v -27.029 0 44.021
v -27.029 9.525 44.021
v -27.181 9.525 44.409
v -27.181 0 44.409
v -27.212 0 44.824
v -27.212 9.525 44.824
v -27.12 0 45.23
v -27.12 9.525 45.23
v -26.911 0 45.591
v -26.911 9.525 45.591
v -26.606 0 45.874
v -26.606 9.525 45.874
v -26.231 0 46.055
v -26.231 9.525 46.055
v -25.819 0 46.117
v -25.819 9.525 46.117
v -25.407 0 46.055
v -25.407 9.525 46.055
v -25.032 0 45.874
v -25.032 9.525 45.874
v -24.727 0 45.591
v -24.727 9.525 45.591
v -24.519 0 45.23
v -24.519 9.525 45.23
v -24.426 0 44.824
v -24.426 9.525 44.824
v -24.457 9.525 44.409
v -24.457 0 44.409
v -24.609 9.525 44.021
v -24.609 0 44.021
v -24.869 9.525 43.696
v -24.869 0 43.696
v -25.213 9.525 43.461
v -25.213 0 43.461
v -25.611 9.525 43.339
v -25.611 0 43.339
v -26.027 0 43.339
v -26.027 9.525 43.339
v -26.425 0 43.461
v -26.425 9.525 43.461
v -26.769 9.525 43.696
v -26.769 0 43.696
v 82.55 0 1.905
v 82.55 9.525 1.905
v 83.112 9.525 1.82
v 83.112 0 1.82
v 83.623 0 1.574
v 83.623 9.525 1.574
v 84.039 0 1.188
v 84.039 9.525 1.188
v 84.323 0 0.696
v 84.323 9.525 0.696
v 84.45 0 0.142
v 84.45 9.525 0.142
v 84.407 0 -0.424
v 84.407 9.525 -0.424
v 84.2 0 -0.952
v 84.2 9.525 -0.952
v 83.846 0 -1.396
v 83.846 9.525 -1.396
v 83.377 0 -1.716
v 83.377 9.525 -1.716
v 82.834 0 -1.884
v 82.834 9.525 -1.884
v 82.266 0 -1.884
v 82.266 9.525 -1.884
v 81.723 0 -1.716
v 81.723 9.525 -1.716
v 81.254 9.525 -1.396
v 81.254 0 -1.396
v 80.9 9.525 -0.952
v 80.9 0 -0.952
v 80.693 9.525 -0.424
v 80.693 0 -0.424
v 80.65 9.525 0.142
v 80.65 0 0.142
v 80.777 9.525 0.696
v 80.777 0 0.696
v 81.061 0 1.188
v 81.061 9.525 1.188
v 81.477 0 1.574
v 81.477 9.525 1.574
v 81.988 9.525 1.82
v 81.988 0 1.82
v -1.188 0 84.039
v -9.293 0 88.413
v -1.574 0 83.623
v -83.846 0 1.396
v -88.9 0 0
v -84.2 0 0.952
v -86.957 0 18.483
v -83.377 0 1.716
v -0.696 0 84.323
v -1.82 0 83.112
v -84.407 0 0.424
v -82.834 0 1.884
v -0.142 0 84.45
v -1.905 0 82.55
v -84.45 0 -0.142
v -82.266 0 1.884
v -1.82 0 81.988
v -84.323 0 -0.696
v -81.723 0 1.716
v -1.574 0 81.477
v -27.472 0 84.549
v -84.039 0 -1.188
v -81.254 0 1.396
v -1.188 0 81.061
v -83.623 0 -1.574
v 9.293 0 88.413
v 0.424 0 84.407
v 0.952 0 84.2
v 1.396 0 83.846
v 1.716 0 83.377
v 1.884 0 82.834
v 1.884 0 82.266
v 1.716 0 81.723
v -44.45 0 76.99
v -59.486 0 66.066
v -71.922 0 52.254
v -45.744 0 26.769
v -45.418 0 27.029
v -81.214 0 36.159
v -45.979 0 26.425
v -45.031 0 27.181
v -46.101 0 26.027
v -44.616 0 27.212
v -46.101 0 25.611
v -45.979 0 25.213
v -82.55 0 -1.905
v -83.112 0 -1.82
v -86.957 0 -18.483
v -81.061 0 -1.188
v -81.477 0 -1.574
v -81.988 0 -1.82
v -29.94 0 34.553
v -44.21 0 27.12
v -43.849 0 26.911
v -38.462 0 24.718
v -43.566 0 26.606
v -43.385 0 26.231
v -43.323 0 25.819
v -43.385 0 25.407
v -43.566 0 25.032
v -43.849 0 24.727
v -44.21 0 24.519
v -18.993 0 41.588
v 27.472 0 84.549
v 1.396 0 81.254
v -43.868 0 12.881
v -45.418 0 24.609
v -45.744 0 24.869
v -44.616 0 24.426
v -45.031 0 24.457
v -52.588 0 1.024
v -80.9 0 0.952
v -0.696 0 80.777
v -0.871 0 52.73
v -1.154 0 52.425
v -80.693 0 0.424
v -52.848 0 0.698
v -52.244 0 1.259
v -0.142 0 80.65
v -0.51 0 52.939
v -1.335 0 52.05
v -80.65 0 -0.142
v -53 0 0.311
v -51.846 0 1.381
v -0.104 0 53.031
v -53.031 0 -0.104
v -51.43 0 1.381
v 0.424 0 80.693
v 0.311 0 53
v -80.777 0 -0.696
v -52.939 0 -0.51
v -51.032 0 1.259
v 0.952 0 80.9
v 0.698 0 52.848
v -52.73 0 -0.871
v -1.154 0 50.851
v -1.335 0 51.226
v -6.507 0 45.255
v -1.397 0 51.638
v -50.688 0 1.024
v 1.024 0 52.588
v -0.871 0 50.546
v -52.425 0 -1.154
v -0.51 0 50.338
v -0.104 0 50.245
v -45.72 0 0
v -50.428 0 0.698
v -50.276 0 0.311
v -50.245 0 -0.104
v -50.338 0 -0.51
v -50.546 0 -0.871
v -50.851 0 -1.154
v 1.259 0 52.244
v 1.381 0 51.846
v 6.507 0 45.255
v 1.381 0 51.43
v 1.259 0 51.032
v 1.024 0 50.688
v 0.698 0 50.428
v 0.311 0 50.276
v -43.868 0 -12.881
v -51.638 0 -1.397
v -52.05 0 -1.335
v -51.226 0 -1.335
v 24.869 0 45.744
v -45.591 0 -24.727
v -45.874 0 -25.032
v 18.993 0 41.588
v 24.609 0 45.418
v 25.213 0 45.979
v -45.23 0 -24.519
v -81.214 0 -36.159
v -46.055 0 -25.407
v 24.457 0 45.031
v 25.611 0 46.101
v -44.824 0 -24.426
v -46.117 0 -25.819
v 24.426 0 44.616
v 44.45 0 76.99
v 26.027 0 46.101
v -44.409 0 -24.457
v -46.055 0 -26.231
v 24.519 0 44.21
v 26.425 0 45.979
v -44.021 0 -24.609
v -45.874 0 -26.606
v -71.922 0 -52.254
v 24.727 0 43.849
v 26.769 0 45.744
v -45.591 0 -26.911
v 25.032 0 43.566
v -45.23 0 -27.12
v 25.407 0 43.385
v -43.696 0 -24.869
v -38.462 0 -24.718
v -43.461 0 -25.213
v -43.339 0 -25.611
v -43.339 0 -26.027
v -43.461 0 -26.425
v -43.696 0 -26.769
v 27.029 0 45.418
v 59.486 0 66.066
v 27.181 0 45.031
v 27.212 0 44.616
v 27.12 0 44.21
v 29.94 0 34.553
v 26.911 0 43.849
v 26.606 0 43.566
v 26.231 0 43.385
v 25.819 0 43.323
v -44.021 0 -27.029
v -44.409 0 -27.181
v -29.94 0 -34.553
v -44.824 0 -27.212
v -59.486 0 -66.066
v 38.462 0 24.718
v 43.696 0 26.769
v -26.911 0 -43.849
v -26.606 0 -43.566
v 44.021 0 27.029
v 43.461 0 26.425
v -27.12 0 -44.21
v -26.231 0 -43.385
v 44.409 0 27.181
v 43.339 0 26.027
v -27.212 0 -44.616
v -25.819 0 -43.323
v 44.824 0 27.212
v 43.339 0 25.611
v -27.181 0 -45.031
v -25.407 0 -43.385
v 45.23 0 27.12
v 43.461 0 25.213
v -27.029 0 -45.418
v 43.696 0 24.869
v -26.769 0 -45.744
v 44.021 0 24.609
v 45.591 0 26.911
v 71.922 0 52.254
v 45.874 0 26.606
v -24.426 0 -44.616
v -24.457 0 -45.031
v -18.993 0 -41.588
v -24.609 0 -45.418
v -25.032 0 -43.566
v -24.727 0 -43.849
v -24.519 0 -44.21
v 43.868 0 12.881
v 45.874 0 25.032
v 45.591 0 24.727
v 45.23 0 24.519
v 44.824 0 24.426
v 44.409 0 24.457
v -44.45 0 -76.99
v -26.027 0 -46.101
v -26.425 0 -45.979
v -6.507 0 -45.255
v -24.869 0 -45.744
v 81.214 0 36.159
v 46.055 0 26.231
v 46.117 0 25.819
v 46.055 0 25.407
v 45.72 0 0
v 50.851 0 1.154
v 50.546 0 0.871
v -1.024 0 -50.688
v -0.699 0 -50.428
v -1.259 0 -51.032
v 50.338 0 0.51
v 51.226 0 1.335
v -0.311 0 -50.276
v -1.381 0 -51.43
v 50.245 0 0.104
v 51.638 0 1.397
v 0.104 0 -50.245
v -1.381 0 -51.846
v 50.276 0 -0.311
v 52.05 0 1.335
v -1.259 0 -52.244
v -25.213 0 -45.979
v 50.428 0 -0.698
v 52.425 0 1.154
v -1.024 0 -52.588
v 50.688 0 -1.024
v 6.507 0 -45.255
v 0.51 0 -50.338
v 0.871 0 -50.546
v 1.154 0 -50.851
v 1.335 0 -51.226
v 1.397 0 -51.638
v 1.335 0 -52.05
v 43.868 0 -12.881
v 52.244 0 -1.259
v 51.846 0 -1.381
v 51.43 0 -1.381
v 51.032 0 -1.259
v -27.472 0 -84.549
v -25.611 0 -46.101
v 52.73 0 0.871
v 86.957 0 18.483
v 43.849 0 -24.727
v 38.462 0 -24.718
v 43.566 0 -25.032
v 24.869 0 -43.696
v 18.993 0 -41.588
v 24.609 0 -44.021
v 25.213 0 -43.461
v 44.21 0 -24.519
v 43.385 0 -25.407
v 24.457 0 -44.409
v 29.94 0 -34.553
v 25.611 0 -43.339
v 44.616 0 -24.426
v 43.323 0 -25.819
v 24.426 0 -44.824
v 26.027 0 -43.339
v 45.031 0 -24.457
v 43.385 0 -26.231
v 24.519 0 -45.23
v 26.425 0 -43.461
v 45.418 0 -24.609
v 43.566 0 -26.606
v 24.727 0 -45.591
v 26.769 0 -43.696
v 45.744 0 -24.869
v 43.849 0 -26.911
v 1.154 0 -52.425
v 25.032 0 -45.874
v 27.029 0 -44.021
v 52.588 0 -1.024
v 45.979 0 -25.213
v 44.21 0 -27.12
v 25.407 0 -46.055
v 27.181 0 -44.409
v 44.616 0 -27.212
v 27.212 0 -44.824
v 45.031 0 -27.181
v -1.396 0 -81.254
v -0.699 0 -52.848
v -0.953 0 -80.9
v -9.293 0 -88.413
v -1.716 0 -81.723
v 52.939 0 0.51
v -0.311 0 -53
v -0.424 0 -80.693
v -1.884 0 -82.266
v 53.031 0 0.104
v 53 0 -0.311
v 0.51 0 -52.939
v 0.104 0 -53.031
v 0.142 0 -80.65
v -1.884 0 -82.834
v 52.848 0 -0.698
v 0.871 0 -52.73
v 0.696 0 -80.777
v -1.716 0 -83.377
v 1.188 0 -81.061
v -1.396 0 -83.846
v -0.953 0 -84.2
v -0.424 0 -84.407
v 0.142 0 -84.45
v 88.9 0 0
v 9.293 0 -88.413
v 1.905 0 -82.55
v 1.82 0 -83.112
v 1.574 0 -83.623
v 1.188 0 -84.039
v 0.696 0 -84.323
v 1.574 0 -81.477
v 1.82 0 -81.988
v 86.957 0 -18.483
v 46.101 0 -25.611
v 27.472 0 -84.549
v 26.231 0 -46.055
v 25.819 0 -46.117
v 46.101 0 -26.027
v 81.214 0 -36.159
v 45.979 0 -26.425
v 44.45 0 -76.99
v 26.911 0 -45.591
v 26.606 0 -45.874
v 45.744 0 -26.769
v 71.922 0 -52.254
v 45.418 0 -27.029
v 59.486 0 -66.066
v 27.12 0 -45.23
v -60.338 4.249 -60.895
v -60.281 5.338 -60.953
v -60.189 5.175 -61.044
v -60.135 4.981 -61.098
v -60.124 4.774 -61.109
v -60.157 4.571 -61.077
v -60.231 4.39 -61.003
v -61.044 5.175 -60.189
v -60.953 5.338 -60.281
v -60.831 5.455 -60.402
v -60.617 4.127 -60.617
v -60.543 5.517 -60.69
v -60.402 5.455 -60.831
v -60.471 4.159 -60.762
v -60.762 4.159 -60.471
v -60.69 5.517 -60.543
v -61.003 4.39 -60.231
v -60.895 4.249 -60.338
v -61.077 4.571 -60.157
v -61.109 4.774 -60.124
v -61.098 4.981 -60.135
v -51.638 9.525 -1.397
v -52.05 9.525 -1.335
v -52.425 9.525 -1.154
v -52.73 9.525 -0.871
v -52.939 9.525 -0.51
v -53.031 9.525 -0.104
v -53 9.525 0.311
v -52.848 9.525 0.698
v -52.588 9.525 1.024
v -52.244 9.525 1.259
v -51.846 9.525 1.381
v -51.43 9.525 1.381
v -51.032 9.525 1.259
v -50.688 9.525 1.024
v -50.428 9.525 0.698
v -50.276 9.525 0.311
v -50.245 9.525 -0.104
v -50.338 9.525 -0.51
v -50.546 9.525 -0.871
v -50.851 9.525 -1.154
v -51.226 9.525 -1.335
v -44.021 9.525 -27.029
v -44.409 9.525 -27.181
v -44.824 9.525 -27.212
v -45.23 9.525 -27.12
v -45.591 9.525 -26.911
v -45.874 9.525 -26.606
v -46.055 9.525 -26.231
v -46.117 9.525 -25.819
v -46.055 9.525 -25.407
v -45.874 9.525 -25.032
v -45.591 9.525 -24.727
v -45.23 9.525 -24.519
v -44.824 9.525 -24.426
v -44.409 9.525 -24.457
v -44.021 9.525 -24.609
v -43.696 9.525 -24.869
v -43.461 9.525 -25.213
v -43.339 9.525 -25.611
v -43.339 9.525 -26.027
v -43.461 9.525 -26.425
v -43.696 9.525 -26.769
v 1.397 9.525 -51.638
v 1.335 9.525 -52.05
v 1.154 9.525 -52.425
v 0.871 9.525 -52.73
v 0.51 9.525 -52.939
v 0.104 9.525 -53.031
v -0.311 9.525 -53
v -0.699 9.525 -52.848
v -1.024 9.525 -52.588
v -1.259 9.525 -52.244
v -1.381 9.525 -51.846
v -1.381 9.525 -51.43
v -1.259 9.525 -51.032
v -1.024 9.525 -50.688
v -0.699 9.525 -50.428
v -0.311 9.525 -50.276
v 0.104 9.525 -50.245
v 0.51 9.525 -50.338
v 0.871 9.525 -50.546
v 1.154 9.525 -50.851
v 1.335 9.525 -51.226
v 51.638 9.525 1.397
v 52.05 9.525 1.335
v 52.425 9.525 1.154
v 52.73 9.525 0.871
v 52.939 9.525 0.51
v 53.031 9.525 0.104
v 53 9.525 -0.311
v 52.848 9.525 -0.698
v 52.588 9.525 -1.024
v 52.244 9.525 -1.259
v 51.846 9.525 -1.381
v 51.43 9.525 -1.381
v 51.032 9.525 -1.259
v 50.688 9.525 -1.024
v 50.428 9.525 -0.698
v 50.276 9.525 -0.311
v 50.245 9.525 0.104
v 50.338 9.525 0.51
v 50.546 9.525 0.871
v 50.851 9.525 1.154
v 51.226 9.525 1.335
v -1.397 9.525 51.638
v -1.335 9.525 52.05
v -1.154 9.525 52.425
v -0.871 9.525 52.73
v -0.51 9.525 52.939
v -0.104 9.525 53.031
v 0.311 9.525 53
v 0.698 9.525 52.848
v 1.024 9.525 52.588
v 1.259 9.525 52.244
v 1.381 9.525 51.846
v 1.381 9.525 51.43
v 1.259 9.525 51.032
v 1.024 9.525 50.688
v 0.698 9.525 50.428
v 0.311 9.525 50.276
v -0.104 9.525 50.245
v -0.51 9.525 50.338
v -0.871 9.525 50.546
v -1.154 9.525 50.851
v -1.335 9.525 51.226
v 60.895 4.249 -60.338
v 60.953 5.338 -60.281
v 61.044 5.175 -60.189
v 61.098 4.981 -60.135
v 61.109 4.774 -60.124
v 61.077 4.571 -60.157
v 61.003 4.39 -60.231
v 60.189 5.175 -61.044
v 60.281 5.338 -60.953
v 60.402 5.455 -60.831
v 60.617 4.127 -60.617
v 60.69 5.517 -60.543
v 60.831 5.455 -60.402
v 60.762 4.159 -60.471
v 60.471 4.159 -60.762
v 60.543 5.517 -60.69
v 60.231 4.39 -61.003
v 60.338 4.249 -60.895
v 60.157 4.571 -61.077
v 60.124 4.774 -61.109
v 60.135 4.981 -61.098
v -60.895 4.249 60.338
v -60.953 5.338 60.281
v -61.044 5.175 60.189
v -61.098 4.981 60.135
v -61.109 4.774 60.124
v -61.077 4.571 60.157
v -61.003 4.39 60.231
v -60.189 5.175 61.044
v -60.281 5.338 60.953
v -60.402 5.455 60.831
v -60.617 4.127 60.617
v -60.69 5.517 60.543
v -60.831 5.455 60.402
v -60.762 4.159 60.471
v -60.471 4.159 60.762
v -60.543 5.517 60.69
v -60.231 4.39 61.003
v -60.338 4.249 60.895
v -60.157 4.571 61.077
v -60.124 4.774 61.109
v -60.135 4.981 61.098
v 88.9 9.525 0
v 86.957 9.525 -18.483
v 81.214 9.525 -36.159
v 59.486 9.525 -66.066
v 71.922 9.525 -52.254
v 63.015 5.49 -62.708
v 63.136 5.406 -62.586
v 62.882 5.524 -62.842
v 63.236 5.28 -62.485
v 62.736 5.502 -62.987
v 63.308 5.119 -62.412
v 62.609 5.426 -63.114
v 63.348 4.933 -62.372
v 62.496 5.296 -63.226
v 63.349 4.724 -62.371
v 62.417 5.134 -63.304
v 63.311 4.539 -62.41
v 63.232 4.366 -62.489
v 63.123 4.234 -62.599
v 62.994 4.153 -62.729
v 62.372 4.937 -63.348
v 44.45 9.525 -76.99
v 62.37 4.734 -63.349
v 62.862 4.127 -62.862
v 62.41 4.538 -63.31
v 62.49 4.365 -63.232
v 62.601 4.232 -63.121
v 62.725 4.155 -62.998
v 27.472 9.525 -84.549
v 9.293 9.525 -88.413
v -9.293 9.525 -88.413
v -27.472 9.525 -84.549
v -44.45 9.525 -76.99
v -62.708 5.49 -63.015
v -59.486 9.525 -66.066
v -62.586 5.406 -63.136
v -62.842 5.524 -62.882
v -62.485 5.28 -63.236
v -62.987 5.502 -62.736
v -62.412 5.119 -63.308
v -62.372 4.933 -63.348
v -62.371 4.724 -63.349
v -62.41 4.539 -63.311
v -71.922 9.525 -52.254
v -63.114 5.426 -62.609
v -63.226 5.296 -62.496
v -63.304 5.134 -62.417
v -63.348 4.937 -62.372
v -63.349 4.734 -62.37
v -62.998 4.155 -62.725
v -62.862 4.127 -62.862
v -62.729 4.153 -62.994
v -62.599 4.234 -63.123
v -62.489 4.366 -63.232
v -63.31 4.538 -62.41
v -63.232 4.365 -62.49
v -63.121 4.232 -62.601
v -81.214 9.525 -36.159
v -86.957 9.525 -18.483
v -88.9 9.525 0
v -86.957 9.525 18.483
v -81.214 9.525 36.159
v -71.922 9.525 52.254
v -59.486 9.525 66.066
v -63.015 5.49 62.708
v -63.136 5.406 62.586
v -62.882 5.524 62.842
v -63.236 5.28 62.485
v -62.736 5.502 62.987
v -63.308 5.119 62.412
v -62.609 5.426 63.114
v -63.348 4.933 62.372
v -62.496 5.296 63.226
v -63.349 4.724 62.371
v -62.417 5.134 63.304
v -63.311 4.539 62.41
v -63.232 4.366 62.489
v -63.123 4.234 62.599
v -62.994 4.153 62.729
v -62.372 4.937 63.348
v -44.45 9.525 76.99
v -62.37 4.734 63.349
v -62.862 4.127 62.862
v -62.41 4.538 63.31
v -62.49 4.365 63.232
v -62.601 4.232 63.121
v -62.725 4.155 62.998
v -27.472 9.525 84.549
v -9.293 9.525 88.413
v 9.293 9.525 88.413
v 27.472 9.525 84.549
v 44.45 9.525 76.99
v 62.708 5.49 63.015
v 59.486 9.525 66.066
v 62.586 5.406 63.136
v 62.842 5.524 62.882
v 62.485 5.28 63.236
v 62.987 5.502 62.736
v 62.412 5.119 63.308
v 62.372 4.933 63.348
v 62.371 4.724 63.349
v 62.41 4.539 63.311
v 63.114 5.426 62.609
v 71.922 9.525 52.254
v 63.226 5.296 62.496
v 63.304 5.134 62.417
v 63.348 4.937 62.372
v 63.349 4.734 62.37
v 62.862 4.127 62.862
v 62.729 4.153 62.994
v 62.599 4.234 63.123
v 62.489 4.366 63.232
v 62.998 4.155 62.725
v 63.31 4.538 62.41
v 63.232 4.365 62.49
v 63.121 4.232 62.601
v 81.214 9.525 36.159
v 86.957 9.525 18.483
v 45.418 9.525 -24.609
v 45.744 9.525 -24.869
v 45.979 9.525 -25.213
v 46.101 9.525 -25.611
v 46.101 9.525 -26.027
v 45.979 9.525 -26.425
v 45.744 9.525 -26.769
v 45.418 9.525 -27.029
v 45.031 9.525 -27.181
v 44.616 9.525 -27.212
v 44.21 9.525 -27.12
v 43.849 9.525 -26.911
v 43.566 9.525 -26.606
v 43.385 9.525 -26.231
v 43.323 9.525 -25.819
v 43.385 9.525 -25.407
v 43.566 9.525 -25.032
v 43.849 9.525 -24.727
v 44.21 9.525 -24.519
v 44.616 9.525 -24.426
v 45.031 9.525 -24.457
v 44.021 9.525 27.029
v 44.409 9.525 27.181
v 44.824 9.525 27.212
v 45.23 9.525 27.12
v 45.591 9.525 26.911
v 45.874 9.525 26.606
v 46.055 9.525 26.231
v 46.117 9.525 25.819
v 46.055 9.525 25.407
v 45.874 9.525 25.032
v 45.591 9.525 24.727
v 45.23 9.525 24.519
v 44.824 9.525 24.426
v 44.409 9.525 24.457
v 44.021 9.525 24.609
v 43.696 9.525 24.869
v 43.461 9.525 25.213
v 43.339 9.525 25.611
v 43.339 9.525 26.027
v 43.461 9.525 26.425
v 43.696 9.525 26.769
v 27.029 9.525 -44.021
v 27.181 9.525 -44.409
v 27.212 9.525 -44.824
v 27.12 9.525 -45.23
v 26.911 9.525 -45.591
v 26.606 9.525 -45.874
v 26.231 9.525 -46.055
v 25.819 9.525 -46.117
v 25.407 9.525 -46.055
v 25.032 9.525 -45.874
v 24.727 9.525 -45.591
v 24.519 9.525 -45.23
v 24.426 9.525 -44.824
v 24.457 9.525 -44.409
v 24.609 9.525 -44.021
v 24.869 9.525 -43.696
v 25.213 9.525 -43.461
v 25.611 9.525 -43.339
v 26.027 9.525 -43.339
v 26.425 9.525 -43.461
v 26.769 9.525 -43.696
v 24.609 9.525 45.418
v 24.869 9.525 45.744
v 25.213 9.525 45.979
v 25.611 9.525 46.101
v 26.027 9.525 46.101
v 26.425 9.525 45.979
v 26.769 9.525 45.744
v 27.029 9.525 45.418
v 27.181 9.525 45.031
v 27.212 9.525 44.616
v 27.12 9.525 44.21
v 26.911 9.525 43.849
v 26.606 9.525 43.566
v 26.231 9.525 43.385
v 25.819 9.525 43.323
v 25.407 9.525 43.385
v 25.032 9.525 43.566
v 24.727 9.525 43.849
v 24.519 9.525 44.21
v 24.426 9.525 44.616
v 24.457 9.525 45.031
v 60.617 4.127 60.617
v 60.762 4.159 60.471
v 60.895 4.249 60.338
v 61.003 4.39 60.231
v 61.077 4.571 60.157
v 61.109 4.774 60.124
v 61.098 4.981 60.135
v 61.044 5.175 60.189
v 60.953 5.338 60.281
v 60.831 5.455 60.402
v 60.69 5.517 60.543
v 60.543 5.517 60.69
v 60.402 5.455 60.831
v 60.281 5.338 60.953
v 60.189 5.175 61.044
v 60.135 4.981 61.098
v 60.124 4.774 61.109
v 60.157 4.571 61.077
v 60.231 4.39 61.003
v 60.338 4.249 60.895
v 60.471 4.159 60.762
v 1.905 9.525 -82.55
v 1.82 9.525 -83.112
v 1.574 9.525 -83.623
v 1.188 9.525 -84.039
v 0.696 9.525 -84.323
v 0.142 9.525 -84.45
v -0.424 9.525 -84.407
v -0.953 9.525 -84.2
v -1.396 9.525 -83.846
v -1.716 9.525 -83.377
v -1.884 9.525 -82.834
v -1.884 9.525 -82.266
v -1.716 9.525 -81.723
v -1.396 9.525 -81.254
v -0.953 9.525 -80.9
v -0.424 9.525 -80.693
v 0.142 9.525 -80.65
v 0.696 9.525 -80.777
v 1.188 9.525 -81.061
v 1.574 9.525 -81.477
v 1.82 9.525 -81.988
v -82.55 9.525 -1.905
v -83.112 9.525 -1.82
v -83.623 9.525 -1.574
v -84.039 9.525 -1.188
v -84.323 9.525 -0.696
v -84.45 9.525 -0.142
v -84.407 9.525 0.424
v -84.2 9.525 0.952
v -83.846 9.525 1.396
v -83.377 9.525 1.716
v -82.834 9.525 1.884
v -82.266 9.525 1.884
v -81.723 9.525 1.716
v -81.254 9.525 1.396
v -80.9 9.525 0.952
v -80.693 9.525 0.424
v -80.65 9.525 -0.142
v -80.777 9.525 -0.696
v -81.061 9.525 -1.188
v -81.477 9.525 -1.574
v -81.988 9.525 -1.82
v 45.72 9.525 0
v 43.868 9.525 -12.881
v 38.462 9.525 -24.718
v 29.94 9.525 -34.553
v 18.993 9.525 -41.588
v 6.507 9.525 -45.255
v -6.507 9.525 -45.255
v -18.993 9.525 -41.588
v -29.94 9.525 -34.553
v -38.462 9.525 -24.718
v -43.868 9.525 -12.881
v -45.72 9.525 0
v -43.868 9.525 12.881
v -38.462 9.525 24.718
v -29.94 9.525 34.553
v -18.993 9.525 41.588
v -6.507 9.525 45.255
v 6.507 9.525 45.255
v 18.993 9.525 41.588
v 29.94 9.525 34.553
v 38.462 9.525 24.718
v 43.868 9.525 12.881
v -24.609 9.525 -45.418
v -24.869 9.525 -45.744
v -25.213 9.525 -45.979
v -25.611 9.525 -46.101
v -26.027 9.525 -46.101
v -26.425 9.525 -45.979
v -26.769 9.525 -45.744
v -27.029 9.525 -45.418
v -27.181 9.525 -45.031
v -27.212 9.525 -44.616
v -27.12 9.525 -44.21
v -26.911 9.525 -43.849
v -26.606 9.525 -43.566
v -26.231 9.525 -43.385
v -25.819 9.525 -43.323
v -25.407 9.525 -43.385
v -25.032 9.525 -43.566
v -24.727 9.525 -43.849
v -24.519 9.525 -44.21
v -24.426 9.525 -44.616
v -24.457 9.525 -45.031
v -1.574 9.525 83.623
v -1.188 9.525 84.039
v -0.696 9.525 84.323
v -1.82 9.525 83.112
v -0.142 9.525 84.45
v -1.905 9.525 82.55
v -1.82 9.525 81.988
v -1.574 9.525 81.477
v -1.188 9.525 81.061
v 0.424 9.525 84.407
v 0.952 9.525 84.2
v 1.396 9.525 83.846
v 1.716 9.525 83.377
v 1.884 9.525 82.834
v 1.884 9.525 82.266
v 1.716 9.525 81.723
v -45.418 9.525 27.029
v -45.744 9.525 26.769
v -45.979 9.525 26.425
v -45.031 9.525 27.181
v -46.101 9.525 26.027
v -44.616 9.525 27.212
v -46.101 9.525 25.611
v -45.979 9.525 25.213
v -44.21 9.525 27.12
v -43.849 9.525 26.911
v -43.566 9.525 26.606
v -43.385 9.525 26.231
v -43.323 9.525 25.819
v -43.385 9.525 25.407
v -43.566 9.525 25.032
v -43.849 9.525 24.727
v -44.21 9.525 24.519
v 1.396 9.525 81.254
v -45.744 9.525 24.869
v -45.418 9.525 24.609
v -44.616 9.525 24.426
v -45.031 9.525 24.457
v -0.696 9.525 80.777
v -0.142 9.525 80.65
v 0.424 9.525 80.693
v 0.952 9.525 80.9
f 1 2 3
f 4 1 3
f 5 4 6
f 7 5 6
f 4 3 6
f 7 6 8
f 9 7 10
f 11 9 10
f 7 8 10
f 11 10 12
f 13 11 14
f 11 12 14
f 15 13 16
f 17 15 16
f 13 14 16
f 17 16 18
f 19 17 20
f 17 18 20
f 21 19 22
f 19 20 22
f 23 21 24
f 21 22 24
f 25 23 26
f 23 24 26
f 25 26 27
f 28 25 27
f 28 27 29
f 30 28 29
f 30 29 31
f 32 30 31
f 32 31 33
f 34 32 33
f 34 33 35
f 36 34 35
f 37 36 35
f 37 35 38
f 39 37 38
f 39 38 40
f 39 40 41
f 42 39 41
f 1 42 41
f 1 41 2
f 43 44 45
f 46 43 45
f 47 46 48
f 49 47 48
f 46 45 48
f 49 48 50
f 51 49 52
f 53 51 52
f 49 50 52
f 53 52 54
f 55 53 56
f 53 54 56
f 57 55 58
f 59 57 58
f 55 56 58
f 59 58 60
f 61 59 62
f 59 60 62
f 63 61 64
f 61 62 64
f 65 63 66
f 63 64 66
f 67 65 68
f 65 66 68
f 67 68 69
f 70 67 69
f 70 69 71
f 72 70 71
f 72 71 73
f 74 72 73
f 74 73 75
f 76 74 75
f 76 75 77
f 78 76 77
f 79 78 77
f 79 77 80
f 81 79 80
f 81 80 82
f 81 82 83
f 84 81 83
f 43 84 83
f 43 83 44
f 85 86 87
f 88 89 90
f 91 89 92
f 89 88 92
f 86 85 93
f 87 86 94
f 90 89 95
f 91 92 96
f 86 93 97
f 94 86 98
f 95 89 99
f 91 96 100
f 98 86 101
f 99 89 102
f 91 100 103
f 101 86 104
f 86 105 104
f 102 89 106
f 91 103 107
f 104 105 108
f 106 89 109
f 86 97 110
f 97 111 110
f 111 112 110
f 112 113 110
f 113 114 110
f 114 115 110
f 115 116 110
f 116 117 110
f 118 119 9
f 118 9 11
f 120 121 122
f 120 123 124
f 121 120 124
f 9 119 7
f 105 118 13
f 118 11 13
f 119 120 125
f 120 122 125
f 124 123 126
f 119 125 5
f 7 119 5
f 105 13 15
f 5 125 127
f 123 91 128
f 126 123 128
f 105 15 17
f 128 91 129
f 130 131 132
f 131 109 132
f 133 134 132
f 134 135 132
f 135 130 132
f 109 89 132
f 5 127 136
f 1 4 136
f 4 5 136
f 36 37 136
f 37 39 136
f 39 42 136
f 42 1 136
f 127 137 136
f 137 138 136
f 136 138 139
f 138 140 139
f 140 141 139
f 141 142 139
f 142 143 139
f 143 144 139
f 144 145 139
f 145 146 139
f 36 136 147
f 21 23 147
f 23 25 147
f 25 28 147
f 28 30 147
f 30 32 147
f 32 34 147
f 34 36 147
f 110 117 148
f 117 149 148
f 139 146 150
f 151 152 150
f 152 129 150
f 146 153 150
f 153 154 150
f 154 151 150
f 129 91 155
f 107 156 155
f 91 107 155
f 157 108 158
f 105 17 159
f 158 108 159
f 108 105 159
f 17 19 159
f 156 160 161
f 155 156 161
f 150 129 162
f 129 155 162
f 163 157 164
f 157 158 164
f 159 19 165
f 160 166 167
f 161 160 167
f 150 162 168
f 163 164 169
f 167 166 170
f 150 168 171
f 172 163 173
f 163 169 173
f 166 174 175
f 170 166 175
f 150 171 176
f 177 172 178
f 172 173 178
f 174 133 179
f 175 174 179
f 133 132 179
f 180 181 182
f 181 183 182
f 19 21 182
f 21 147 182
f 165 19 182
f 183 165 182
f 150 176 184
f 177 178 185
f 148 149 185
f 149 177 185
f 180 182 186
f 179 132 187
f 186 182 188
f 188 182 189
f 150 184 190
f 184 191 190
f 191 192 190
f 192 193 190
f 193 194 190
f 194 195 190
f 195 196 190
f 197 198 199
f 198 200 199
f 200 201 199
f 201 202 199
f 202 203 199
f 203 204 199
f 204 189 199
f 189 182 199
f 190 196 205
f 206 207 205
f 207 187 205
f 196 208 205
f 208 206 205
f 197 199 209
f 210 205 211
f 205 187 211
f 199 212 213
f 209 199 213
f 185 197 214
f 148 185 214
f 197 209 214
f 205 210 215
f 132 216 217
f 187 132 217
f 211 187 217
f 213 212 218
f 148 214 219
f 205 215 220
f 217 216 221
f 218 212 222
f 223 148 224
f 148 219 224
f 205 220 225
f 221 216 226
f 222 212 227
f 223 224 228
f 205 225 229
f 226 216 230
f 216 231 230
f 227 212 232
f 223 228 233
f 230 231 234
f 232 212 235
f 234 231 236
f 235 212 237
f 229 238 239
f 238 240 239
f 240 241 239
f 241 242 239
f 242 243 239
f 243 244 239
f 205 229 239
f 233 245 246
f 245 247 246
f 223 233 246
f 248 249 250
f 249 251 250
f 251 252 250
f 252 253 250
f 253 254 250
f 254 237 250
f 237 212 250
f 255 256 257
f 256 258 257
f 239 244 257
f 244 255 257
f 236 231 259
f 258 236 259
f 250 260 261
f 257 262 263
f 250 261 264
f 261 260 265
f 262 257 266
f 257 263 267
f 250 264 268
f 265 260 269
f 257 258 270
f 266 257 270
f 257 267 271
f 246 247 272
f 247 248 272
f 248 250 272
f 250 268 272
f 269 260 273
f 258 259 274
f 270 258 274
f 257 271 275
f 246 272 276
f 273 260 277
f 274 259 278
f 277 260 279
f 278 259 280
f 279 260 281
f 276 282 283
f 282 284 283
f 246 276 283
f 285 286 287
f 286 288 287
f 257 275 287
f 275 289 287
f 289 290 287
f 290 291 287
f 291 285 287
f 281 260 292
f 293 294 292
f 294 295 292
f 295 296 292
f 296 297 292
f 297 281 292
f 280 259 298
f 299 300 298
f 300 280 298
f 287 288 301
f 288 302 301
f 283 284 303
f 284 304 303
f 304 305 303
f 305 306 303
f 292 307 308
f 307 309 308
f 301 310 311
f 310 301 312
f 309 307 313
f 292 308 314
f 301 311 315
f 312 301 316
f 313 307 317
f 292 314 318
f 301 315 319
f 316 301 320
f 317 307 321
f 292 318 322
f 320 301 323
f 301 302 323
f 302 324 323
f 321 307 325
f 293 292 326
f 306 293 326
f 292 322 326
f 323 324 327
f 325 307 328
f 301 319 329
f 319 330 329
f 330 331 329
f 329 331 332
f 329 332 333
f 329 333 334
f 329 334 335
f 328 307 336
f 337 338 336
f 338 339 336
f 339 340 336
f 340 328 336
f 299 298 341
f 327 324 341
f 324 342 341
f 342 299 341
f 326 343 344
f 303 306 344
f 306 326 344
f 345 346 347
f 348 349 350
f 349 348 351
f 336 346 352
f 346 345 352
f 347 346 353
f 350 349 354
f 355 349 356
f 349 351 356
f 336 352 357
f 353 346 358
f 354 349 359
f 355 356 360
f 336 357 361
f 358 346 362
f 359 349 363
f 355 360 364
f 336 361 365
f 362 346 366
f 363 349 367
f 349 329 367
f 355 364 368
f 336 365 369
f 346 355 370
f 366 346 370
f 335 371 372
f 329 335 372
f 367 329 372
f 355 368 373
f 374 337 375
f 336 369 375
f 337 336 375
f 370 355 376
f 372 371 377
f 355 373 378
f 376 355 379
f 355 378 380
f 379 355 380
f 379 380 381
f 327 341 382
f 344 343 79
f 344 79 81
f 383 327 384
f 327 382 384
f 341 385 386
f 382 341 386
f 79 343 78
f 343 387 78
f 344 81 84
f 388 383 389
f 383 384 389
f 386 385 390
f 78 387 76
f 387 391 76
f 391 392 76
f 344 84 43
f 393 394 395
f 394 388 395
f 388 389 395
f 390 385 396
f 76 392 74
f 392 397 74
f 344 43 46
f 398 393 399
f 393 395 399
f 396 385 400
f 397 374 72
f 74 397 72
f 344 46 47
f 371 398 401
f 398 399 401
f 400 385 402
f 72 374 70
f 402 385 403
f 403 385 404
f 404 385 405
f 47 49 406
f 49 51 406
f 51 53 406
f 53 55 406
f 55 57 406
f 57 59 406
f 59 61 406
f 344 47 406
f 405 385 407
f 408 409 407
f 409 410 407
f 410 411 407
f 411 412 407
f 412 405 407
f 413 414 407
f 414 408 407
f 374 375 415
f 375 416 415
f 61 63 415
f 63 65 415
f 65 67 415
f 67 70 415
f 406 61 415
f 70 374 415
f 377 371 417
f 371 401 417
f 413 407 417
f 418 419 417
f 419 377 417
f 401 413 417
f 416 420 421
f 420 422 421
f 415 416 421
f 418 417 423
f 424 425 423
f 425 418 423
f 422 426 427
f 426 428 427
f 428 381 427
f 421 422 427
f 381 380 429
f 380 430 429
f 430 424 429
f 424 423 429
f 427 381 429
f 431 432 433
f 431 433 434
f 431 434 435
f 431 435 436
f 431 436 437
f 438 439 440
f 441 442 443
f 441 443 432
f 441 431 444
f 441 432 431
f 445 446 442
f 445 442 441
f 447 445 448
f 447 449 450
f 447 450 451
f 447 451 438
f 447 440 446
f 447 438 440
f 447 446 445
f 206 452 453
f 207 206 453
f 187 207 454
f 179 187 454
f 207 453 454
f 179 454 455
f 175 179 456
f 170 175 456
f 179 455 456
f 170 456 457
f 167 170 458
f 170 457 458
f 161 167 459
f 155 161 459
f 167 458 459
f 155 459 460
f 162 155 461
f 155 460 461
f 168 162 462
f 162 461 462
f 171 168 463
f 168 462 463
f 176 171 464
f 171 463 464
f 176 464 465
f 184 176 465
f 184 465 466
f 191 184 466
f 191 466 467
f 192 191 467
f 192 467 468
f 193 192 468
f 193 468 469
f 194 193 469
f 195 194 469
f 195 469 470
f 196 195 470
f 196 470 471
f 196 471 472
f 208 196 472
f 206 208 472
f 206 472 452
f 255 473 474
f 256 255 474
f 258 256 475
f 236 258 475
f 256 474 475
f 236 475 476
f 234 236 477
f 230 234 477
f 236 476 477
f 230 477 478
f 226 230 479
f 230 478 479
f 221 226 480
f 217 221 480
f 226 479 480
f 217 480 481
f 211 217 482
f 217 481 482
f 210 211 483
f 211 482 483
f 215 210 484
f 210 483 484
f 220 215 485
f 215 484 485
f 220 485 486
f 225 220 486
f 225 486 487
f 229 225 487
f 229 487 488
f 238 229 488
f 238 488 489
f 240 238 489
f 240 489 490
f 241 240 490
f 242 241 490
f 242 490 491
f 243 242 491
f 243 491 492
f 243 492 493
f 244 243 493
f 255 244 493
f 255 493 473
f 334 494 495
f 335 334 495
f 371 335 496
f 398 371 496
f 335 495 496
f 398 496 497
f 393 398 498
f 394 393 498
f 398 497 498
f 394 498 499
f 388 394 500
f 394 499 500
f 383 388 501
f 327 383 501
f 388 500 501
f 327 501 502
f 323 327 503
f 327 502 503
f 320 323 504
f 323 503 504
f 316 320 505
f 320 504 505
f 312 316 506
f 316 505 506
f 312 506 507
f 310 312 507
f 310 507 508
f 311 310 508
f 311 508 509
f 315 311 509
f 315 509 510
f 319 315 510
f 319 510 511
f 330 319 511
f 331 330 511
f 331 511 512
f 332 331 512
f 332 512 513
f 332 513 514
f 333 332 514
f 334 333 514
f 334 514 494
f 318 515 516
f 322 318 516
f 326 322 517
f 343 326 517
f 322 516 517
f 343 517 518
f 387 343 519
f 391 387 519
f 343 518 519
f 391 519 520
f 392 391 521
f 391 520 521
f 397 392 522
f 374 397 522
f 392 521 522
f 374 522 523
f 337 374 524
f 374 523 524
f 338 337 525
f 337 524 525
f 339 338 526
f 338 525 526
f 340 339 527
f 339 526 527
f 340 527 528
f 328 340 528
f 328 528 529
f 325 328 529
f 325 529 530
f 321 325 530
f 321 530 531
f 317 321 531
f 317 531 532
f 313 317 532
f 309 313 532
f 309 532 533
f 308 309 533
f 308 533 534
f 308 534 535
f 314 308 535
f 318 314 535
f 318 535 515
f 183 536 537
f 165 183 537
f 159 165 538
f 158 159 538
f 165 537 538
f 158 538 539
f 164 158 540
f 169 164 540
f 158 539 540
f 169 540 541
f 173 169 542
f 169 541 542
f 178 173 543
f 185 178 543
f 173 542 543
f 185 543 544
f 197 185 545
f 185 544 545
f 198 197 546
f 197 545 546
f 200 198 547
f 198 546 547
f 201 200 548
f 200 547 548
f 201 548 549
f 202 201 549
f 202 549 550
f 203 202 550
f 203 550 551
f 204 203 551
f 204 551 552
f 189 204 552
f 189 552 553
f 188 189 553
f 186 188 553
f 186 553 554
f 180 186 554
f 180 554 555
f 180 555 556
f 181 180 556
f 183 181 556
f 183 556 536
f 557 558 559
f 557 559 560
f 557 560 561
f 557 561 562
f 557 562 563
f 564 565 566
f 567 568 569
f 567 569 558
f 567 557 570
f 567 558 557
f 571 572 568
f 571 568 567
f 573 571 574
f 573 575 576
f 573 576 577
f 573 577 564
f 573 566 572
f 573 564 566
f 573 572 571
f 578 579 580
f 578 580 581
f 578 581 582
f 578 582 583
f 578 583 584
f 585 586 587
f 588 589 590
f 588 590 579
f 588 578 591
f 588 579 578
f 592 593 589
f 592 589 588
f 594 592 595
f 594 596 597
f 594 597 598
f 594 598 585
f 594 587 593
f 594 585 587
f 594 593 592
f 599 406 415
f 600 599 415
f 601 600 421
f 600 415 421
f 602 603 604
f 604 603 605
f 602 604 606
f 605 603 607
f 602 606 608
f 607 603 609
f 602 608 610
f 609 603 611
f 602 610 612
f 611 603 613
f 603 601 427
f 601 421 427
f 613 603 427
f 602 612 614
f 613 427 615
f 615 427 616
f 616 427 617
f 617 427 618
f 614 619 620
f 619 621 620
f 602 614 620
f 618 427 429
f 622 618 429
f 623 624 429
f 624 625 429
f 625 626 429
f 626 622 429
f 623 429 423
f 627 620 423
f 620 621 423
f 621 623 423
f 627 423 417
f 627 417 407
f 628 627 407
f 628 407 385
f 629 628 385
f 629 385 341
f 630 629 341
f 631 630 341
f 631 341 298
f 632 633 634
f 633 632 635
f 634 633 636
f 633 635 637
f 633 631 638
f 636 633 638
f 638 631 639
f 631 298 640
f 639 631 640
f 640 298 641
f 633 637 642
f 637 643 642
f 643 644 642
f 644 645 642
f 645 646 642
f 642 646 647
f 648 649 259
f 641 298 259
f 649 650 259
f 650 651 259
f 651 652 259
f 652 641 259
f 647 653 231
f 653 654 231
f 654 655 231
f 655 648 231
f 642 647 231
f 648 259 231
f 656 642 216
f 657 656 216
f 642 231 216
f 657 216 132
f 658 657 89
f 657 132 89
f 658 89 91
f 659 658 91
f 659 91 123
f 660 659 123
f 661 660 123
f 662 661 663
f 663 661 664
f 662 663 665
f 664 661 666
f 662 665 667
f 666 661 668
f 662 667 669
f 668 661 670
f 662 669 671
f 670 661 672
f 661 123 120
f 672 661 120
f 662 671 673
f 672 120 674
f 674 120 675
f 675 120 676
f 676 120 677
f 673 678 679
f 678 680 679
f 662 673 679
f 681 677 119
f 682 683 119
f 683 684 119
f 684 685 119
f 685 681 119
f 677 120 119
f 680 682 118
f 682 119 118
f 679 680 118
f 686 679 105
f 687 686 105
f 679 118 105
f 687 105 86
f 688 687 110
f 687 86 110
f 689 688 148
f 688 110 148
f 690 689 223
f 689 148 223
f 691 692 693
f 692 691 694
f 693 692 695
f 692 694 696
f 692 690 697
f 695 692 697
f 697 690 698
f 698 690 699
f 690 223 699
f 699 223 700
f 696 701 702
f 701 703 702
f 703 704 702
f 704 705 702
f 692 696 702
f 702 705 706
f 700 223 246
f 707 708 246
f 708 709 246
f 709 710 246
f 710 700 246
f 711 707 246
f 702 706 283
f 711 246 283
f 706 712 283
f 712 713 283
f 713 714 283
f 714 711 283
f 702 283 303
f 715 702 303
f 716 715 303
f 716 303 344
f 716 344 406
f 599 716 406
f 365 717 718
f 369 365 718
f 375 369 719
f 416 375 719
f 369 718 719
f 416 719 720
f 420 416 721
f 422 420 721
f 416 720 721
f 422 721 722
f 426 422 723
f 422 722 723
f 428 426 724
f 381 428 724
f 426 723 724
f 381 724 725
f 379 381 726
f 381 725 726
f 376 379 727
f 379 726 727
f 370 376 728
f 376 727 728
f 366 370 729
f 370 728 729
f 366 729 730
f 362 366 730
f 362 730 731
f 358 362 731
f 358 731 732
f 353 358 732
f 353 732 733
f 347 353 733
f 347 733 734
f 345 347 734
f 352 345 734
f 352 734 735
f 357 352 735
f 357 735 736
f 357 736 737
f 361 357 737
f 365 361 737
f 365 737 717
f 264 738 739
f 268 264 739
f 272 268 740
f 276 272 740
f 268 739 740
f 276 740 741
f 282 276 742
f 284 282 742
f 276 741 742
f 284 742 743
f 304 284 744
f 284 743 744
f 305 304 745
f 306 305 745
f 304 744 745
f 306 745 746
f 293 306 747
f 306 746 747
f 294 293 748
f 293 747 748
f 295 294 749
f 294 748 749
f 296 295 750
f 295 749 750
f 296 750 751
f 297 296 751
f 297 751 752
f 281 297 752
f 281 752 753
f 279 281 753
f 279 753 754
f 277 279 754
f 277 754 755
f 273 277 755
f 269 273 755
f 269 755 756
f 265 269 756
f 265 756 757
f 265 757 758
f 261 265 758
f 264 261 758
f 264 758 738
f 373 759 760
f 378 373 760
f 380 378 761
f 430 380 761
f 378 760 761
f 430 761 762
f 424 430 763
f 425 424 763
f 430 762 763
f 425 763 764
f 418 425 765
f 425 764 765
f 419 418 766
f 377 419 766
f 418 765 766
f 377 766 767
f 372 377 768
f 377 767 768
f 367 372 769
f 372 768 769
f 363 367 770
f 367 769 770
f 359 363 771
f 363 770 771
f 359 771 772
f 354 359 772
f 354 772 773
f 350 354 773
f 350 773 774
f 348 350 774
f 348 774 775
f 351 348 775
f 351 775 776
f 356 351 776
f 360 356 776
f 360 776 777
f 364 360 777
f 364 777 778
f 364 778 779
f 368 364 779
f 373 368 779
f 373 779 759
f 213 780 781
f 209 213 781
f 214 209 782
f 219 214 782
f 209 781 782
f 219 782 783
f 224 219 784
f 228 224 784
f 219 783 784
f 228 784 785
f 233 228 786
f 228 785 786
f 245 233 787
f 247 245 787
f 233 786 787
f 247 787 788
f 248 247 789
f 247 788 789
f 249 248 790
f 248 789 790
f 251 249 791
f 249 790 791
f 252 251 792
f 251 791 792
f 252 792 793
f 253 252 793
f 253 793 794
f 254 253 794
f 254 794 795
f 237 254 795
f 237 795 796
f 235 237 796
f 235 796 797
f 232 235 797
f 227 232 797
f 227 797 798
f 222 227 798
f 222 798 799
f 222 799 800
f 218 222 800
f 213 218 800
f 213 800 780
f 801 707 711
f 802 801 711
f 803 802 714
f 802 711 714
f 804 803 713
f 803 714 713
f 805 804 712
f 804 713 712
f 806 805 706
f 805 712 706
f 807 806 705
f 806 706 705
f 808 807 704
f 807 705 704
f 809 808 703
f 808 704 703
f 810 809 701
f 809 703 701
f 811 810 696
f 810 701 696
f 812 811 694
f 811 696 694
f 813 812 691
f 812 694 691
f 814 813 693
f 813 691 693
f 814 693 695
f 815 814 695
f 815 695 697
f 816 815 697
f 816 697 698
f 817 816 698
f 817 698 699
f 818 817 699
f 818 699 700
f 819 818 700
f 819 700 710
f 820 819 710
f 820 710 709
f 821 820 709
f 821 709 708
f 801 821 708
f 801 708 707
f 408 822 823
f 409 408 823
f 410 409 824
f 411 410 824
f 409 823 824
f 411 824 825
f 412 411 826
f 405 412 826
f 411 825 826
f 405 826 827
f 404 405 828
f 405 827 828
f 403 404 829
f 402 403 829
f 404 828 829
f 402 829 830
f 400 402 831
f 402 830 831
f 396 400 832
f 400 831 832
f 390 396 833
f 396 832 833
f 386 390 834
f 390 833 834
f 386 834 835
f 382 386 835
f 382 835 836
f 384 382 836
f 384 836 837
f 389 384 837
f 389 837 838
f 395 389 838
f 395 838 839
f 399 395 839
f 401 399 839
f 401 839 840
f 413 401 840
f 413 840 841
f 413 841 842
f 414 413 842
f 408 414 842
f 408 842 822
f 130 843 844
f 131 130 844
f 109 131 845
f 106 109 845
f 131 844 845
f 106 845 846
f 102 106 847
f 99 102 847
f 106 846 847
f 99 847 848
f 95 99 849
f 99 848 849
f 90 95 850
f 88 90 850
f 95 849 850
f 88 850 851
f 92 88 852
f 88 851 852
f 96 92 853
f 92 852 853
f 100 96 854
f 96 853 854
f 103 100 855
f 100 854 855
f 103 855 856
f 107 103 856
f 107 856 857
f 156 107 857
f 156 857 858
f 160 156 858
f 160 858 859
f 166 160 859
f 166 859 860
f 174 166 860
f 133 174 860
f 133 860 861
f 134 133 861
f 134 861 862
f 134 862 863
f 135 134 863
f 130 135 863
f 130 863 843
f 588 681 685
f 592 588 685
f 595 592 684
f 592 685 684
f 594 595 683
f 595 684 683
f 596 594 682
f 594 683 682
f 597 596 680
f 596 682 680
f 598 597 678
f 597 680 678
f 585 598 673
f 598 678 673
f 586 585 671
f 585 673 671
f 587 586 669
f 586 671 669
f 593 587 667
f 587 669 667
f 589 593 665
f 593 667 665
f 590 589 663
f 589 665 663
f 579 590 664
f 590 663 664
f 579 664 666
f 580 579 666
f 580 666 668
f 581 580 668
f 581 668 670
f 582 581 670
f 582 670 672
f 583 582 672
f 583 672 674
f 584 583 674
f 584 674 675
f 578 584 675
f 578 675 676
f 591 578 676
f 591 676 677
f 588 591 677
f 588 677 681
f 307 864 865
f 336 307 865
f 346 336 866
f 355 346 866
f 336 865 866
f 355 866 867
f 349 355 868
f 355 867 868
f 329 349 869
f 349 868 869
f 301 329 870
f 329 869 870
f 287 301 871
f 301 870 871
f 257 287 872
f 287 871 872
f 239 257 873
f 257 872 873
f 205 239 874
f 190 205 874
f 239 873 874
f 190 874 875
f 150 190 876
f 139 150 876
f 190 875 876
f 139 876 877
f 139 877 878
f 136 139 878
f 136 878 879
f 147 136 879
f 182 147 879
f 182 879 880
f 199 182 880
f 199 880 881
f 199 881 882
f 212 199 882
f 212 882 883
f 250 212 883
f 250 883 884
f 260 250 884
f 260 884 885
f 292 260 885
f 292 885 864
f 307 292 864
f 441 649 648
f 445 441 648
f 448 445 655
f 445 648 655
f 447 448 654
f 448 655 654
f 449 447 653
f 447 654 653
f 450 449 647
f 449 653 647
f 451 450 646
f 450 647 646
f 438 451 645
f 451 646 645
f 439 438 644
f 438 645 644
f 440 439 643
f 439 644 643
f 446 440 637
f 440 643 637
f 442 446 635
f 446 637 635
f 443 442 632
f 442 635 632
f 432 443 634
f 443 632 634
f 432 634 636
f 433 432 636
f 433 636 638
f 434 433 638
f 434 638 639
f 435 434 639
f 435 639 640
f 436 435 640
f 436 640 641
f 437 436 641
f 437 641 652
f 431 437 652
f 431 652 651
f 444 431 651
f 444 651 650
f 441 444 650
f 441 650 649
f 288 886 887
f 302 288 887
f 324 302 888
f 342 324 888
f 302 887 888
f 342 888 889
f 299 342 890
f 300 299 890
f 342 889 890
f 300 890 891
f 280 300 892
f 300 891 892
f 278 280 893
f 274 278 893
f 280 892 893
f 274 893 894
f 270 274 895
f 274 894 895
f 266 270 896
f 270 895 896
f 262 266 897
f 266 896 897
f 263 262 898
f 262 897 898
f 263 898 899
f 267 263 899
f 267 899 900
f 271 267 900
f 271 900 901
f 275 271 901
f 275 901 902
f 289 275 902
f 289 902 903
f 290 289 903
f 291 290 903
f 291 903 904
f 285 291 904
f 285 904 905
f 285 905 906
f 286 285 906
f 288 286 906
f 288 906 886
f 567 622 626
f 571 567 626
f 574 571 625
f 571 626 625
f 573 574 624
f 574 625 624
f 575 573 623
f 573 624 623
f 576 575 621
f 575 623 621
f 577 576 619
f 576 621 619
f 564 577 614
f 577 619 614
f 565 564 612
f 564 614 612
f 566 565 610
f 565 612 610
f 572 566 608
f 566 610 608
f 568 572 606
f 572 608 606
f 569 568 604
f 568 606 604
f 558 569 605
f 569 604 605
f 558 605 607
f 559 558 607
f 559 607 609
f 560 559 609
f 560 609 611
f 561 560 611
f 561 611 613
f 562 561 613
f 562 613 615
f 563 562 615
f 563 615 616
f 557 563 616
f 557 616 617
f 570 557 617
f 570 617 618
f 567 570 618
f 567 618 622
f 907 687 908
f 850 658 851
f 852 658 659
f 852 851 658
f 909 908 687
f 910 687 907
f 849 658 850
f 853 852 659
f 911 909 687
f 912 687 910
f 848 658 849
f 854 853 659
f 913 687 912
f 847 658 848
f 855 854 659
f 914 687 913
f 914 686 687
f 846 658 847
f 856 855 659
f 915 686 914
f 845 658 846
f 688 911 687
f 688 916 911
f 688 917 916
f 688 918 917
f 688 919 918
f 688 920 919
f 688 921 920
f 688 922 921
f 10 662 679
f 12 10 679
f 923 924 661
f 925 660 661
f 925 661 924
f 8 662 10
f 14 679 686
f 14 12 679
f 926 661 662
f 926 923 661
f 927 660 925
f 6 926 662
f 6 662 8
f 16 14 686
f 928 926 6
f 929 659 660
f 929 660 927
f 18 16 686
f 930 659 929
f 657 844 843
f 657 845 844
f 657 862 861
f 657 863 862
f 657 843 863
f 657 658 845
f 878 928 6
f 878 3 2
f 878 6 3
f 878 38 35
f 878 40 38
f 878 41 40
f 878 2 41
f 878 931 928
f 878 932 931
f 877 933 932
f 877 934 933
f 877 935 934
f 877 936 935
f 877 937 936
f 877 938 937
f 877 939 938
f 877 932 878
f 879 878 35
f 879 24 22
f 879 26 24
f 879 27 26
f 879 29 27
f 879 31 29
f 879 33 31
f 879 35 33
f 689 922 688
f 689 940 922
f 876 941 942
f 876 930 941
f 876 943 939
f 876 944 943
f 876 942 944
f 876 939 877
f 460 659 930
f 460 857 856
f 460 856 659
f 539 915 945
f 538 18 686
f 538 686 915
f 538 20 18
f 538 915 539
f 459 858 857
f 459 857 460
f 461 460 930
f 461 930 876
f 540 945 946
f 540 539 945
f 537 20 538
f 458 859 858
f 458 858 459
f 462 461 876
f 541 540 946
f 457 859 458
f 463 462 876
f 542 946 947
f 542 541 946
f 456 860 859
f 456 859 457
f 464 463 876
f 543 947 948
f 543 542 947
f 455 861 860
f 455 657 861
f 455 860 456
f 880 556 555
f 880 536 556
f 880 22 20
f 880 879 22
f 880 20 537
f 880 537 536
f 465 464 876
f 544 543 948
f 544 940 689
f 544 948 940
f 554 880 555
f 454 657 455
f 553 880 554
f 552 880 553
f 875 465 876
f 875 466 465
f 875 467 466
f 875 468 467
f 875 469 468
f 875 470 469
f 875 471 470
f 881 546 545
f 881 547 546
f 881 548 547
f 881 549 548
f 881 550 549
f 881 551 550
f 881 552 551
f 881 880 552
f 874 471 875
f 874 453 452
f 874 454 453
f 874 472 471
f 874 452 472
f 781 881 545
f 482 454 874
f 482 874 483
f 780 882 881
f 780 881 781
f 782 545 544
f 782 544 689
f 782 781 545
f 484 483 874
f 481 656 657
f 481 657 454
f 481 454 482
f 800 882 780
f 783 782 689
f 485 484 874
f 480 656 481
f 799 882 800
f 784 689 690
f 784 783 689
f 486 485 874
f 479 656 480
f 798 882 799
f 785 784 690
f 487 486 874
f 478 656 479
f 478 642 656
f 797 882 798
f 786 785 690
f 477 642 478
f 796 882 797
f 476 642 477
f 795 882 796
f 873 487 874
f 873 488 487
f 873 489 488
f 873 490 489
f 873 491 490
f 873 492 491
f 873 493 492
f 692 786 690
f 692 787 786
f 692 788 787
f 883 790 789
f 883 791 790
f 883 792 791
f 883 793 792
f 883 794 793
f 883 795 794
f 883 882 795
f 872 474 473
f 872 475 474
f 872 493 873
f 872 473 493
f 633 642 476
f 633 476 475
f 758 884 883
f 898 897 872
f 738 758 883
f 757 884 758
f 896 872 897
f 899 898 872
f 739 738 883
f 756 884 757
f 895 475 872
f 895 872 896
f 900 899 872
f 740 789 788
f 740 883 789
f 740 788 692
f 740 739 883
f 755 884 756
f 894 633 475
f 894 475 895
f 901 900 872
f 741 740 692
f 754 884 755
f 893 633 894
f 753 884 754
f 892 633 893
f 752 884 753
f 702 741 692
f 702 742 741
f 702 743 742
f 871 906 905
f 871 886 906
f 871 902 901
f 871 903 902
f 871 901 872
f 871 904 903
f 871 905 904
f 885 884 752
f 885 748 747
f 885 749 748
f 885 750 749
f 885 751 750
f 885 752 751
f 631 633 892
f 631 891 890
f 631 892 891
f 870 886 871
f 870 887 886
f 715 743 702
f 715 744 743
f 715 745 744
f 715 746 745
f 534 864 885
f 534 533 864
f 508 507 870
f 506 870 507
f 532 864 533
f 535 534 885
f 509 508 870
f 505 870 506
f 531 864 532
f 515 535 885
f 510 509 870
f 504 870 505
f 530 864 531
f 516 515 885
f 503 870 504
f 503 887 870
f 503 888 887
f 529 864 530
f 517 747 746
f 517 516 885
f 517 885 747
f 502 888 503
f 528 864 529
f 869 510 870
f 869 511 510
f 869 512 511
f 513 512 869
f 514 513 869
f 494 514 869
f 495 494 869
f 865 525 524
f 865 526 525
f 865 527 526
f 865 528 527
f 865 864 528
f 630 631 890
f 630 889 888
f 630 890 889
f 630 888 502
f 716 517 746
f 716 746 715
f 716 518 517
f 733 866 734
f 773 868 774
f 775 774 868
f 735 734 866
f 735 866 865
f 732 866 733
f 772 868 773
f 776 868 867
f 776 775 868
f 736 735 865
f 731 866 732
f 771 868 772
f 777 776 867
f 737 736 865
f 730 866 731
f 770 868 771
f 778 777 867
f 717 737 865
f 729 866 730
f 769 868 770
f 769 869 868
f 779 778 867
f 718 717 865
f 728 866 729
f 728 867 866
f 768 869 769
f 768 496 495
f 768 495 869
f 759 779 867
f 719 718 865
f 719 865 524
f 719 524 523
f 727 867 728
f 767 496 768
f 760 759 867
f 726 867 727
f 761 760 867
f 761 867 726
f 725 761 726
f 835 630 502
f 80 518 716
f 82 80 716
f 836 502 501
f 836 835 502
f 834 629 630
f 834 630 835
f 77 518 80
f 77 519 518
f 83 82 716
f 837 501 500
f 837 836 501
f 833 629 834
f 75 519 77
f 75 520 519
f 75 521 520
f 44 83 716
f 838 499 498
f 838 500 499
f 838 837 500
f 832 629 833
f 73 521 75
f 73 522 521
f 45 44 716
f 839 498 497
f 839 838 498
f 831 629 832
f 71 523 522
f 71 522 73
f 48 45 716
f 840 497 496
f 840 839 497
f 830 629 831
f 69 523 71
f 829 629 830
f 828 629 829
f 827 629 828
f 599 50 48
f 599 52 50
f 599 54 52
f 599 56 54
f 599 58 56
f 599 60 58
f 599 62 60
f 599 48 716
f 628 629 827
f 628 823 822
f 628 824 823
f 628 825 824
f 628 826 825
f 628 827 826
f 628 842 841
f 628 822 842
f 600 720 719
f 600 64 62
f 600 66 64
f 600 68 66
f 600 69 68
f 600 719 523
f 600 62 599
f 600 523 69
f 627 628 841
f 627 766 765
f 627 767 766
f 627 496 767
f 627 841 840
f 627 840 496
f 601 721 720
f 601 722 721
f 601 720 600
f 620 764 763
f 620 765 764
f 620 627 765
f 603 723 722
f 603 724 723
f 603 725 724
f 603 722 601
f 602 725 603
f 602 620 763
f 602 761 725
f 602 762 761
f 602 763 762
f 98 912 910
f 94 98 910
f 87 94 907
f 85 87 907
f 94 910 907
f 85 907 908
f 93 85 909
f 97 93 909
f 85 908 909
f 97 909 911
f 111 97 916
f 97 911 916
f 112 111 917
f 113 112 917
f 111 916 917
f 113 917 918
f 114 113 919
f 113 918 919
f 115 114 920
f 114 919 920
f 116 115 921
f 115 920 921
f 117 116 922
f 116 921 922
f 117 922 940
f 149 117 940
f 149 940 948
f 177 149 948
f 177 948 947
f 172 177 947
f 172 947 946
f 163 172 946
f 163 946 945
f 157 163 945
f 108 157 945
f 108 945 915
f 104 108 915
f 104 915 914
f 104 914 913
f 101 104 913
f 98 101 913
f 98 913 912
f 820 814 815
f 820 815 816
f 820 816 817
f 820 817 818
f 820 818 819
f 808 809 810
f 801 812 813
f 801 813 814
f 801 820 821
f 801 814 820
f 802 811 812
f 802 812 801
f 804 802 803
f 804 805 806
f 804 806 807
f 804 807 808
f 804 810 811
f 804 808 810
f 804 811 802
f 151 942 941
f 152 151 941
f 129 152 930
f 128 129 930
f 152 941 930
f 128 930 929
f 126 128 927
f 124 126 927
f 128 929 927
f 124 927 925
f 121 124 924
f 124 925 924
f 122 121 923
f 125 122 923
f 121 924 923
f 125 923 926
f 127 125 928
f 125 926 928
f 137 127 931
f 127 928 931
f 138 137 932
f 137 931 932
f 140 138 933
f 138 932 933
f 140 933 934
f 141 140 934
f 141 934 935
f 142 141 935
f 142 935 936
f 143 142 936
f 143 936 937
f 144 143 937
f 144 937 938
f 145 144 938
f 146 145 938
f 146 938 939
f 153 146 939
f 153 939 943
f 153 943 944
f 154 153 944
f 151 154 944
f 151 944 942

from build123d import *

# Parameters (mm, degrees)
SKETCH1_R           = 88.9
BOSS_EXTRUDE1_DEPTH = 9.525
SKETCH2_R           = 45.72
CUT_EXTRUDE1_DEPTH  = 12.7
SKETCH3_R           = 1.397
CUT_EXTRUDE2_DEPTH  = 12.7
CIRPATTERN1_COUNT   = 12
SKETCH4_R           = 1.905
CUT_EXTRUDE3_DEPTH  = 12.7
CIRPATTERN2_COUNT   = 4
SKETCH10_R          = 0.6985
CUT_EXTRUDE5_DEPTH  = 3.175
CIRPATTERN5_COUNT   = 4


with BuildPart() as part:
    # Sketch1 → Boss-Extrude1 (new body)
    with BuildSketch(Plane(origin=(0, 0, 0), x_dir=(1, 0, 0), z_dir=(0, 1, 0))):
        Circle(SKETCH1_R)
    extrude(amount=BOSS_EXTRUDE1_DEPTH)

    # Sketch2 → Cut-Extrude1 (cut)
    with BuildSketch(Plane(origin=(0, 9.525, 0), x_dir=(1, 0, 0), z_dir=(0, 1, 0))):
        Circle(SKETCH2_R)
    extrude(amount=-CUT_EXTRUDE1_DEPTH, mode=Mode.SUBTRACT)

    # Sketch3 → Cut-Extrude2 (cut)
    with BuildSketch(Plane(origin=(0, 9.525, 0), x_dir=(1, 0, 0), z_dir=(0, 1, 0))):
        with Locations((0, 51.6382)):
            Circle(SKETCH3_R)
    cut_extrude2 = extrude(amount=-CUT_EXTRUDE2_DEPTH, mode=Mode.SUBTRACT)

    # CirPattern1: Cut-Extrude2 ×12 about axis
    cirpattern1_axis = Axis((0, 0, 0), (0, 1, 0))
    for i in range(1, CIRPATTERN1_COUNT):
        add(cut_extrude2.rotate(cirpattern1_axis, i * 360 / CIRPATTERN1_COUNT), mode=Mode.SUBTRACT)

    # Sketch4 → Cut-Extrude3 (cut)
    with BuildSketch(Plane(origin=(0, 9.525, 0), x_dir=(1, 0, 0), z_dir=(0, 1, 0))):
        with Locations((0, 82.55)):
            Circle(SKETCH4_R)
    cut_extrude3 = extrude(amount=-CUT_EXTRUDE3_DEPTH, mode=Mode.SUBTRACT)

    # CirPattern2: Cut-Extrude3 ×4 about axis
    cirpattern2_axis = Axis((0, 0, 0), (0, 1, 0))
    for i in range(1, CIRPATTERN2_COUNT):
        add(cut_extrude3.rotate(cirpattern2_axis, i * 360 / CIRPATTERN2_COUNT), mode=Mode.SUBTRACT)

    # Sketch10 → Cut-Extrude5 (cut)
    with BuildSketch(Plane(origin=(-62.861792847, 0, -62.861792847), x_dir=(0, -1, 0), z_dir=(-0.707106781, 0, -0.707106781))):
        with Locations((-4.826, 0)):
            Circle(SKETCH10_R)
    cut_extrude5 = extrude(amount=-CUT_EXTRUDE5_DEPTH, mode=Mode.SUBTRACT)

    # CirPattern5: Cut-Extrude5 ×4 about axis
    cirpattern5_axis = Axis((0, 0, 0), (0, 1, 0))
    for i in range(1, CIRPATTERN5_COUNT):
        add(cut_extrude5.rotate(cirpattern5_axis, i * 360 / CIRPATTERN5_COUNT), mode=Mode.SUBTRACT)


solid = part.part
